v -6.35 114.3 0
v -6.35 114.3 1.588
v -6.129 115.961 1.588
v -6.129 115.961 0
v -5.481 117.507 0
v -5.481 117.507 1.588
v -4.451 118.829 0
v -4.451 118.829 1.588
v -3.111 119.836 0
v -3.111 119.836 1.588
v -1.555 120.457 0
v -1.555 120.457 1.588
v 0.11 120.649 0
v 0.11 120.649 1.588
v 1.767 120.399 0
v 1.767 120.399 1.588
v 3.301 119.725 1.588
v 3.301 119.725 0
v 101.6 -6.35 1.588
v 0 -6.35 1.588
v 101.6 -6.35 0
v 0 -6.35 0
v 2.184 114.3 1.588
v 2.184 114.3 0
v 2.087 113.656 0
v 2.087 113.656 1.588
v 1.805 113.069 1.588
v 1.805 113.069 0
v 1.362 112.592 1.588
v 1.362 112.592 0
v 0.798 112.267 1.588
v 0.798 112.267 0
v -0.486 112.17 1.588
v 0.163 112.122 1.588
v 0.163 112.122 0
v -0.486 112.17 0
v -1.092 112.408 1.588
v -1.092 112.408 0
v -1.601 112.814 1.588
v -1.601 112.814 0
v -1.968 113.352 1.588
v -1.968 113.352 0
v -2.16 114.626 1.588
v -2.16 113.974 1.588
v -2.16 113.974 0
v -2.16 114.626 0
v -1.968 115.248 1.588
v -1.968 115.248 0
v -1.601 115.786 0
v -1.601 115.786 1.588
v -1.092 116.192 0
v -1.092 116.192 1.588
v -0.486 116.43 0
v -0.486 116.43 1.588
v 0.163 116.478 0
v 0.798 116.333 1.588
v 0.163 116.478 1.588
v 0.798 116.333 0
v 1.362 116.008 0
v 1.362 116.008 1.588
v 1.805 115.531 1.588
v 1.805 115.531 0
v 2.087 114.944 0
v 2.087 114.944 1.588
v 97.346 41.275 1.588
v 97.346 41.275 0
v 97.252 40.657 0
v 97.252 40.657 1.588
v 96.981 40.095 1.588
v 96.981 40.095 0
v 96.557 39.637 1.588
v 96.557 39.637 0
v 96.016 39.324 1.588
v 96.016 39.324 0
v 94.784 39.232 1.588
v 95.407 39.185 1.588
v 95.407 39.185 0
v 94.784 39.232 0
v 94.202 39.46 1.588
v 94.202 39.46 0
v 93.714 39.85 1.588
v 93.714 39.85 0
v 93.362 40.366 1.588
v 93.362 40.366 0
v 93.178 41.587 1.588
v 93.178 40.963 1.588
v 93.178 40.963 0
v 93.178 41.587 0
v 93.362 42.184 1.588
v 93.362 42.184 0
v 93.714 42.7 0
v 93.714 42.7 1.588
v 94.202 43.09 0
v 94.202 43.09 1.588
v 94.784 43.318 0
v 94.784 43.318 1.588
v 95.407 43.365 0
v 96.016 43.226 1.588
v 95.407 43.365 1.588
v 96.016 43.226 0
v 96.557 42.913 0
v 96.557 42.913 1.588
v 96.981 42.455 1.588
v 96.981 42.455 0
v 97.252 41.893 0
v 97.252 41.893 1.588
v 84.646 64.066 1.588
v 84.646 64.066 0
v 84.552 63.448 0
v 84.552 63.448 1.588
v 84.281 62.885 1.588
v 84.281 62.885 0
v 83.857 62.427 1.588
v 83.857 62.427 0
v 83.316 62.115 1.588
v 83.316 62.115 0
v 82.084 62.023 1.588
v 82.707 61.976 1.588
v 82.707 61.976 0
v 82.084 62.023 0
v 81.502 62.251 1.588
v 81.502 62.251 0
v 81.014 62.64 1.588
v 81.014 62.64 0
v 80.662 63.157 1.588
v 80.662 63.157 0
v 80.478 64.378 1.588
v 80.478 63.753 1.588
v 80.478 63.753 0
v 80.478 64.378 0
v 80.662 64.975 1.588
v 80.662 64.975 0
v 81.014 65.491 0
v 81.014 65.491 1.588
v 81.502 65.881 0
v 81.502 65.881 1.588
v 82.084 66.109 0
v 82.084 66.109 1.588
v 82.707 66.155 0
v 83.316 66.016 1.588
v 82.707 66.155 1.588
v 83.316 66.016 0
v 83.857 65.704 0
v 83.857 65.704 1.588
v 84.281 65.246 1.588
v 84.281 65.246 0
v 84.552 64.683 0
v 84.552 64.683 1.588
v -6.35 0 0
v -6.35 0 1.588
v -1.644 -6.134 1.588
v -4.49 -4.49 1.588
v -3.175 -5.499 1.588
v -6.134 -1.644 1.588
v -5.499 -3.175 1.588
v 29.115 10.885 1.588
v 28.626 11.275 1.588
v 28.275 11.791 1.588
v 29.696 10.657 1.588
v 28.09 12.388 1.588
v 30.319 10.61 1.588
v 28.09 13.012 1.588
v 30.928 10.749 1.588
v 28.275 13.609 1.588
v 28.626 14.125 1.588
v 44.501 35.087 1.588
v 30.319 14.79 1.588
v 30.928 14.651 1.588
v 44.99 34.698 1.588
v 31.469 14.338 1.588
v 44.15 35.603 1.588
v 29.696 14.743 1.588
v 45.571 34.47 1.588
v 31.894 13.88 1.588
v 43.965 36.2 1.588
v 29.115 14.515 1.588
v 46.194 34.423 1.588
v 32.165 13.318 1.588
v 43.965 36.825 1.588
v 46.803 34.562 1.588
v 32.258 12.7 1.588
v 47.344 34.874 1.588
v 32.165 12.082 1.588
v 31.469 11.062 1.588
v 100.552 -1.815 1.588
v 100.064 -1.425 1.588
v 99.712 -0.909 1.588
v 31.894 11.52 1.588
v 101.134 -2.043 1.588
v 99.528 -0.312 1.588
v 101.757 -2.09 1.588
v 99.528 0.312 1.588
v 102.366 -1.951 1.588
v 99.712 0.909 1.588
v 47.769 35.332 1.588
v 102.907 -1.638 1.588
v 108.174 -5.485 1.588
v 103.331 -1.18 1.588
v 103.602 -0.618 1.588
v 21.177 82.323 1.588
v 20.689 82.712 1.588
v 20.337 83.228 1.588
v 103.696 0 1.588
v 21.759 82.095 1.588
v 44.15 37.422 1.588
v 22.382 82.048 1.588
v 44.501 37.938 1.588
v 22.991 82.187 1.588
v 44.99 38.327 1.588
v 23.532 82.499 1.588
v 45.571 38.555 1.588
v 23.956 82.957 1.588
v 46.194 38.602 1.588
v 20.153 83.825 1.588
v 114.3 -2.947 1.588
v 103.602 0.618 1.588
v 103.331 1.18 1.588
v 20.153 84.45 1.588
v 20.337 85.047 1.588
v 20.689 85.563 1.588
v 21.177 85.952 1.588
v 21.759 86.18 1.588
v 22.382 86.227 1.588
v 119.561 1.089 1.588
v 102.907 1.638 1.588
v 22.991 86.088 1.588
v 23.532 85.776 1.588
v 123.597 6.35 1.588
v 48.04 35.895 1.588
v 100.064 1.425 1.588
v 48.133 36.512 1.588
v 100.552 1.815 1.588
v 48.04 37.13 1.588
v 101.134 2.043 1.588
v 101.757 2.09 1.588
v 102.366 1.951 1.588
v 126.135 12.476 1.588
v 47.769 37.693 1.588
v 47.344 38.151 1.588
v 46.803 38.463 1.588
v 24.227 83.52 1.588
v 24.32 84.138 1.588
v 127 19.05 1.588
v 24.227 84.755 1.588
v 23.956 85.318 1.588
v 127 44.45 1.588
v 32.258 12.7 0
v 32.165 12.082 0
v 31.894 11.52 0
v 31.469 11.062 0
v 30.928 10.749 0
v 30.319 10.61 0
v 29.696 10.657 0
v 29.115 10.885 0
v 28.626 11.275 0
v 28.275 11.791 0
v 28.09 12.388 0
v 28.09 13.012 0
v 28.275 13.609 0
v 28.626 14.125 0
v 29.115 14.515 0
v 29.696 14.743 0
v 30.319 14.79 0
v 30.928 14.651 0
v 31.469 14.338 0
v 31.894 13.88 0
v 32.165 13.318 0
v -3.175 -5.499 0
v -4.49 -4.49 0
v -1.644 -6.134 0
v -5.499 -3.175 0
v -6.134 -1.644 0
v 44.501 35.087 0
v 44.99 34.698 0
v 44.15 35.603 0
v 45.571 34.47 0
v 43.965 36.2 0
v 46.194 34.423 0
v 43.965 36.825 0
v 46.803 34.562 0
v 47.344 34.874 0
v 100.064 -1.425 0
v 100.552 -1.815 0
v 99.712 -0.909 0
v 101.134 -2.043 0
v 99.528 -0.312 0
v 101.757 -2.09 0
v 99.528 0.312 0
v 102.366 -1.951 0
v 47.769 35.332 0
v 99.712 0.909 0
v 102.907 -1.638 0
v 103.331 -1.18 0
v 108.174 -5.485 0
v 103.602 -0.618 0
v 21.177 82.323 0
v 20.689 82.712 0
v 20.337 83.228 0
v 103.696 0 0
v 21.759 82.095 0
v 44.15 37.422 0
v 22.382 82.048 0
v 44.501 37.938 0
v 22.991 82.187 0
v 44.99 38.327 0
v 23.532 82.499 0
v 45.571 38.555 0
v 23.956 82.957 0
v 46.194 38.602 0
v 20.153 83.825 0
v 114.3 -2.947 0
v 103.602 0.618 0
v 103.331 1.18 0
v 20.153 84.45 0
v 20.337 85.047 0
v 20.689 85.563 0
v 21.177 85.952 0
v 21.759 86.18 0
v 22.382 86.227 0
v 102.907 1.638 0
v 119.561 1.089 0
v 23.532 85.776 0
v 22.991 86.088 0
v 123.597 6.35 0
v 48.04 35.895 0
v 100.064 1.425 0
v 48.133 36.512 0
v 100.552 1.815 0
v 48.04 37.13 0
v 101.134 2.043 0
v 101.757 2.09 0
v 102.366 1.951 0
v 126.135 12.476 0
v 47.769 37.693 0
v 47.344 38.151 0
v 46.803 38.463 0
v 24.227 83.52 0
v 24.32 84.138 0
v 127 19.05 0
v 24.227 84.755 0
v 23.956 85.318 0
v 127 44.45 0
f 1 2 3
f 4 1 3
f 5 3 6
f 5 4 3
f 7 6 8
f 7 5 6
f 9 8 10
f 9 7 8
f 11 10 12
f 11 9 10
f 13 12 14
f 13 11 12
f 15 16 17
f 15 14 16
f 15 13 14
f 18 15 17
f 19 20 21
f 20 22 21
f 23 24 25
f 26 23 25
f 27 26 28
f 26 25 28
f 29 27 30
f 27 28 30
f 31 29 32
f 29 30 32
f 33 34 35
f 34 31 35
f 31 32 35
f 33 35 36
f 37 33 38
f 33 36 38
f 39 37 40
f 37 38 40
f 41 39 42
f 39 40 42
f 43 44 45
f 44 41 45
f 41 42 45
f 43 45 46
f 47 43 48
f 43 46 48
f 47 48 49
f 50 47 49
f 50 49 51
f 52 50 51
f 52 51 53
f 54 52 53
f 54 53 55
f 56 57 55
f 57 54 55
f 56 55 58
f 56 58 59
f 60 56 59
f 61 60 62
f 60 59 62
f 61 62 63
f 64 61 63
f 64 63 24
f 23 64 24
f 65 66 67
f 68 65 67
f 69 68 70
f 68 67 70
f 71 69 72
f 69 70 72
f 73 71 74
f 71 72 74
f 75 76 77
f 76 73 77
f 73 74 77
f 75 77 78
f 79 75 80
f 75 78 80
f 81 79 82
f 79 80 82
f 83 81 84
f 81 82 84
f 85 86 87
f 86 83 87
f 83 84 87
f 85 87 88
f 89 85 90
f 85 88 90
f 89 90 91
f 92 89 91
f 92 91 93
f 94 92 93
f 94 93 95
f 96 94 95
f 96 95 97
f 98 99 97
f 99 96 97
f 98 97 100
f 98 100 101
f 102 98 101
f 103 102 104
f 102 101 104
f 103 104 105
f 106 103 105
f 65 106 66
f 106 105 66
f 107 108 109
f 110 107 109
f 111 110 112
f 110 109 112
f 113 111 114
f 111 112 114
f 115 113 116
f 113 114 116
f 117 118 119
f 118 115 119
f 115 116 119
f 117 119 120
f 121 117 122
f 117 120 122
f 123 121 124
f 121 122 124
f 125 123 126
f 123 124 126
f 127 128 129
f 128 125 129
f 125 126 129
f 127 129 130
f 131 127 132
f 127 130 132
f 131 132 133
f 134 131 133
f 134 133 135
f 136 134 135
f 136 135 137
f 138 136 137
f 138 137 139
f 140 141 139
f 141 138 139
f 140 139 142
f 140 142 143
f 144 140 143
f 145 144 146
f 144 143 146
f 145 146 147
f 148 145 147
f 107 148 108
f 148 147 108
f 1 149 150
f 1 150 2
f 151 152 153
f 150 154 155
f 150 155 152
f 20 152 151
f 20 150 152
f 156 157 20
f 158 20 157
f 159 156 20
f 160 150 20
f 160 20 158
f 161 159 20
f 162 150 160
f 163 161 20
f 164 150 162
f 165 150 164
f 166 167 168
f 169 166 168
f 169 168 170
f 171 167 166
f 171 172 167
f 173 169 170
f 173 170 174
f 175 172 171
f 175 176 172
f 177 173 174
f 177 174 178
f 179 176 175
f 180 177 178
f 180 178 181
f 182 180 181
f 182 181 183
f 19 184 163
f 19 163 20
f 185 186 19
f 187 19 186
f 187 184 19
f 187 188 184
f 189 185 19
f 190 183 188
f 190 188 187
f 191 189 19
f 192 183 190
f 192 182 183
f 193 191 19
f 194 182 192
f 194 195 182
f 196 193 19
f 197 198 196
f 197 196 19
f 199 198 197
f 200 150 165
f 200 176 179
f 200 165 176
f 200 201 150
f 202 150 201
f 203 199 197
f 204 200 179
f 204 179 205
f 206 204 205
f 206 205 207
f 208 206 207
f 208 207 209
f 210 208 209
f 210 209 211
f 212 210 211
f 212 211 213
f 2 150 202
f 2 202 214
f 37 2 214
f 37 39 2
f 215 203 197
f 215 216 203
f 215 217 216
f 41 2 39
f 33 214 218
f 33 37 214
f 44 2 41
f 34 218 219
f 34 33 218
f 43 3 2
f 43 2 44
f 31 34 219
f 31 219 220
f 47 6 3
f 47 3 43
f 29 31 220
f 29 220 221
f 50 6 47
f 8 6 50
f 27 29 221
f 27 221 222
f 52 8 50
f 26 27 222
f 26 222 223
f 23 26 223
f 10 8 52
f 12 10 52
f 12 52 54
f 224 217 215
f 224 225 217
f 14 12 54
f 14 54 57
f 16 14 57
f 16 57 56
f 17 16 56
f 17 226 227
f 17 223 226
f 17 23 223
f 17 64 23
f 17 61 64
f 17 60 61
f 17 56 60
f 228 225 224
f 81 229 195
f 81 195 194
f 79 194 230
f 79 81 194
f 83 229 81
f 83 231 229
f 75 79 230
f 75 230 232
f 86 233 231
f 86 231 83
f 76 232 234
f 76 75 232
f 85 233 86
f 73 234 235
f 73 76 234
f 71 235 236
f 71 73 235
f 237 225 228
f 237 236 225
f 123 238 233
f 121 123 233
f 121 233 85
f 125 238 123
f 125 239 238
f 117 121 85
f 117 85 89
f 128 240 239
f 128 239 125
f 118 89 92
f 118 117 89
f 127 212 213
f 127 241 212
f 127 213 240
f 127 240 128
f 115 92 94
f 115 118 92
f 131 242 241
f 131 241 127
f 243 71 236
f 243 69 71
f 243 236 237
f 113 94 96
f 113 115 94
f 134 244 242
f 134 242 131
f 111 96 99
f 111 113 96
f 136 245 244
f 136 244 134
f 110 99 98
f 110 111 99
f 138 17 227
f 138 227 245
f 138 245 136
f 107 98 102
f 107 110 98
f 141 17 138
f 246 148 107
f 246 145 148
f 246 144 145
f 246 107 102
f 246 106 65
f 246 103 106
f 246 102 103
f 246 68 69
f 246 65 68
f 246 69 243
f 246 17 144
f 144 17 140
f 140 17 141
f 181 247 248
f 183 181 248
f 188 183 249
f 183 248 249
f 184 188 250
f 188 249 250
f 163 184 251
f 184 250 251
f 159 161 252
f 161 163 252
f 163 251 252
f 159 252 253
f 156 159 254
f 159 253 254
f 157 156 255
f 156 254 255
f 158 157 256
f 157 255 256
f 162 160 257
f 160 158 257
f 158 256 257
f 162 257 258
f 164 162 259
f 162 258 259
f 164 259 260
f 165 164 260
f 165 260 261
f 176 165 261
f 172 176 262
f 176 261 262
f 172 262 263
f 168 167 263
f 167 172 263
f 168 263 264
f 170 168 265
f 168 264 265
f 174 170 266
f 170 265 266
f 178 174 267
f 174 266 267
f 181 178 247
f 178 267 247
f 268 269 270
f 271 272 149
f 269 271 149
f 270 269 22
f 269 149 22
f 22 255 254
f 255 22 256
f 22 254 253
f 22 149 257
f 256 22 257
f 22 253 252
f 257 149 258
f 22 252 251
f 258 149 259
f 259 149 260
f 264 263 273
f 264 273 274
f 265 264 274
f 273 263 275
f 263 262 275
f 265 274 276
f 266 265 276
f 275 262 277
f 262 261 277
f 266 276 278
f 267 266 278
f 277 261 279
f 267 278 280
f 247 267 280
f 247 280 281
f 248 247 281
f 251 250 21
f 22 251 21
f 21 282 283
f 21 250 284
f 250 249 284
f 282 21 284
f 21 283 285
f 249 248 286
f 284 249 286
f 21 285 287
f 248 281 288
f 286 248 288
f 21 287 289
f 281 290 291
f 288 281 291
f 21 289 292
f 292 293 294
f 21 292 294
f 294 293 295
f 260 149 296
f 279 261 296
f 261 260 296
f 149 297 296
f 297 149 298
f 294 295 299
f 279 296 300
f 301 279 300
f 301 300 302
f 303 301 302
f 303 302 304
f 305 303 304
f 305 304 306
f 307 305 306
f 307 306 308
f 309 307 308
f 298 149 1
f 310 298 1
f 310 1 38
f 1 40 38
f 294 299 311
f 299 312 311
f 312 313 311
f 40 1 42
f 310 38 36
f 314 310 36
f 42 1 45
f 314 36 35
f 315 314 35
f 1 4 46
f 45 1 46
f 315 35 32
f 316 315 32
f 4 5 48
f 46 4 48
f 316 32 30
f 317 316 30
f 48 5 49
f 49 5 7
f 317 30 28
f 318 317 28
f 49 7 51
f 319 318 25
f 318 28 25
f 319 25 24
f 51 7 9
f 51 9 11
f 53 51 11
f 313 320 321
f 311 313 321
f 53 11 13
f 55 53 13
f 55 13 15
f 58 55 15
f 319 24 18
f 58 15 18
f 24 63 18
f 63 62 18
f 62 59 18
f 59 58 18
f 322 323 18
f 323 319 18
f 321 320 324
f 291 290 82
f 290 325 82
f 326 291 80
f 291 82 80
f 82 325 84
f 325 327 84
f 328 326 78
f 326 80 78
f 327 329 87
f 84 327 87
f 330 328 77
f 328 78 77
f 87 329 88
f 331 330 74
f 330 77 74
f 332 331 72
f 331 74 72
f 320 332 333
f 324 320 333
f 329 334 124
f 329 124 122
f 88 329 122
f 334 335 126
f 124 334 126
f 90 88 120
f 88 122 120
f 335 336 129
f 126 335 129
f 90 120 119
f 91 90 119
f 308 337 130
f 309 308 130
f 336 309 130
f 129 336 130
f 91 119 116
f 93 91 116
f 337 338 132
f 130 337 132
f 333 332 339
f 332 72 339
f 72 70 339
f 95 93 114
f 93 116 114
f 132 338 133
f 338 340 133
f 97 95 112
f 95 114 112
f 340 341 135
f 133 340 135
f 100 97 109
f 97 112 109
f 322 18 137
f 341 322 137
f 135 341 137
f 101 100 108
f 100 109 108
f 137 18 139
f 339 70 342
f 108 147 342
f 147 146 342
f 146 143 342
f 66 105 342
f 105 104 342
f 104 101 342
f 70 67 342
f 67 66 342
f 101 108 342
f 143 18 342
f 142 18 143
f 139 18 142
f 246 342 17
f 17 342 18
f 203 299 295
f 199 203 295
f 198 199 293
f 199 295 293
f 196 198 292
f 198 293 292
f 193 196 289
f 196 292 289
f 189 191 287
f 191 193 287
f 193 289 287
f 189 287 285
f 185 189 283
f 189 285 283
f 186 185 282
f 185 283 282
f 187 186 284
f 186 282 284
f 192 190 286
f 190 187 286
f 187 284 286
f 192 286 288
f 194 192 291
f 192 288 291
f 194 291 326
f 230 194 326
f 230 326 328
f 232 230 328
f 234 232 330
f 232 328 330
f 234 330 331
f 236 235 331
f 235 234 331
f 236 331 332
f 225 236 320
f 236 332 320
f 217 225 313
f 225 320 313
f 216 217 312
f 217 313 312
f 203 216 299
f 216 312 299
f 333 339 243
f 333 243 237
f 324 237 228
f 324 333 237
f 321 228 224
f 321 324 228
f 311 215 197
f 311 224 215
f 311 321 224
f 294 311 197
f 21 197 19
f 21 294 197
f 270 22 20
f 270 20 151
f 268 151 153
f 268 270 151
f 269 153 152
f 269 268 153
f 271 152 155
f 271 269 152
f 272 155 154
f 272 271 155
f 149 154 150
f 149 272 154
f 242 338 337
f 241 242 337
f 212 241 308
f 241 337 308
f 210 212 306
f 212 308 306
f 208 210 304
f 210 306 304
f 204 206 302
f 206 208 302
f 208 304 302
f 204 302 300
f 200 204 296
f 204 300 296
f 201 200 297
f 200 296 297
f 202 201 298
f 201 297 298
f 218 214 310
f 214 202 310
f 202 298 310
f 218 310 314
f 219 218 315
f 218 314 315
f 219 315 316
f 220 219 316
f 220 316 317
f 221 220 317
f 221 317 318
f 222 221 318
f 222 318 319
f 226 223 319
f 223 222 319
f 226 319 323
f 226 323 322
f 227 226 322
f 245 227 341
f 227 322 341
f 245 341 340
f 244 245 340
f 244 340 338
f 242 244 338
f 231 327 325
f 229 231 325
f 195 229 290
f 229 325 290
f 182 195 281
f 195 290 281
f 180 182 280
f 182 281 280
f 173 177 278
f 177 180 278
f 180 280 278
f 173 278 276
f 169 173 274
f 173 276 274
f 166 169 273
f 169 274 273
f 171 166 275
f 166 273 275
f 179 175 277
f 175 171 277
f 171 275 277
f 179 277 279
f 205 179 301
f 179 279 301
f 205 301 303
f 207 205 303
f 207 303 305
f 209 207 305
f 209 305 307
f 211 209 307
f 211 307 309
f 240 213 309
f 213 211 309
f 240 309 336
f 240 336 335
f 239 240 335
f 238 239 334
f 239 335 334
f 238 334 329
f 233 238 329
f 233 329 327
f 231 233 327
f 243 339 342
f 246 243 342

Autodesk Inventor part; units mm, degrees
ref_plane "YZ Plane" through (0, 0, 0) normal (1, 0, 0) x (0, 1, 0)
ref_plane "XZ Plane" through (0, 0, 0) normal (0, 1, 0) x (-1, 0, 0)
ref_plane "XY Plane" through (0, 0, 0) normal (0, 0, 1) x (1, 0, 0)
sketch "Block1" plane through (0, 0, 0) normal (0, 0, 1) x (1, 0, 0)
  circle A0 centre (36.7608, -51.6694) radius 2.0955
  circle A1 centre (30.4108, -10.3944) radius 2.0955
  circle A2 centre (17.7108, 12.3965) radius 2.0955
  circle A3 centre (-18.8017, -15.1569) radius 2.0955
  circle A4 centre (-34.6767, -38.9694) radius 2.0955
  line L0 (-64.8392, -58.0194) -> (36.7608, -58.0194)
  line L1 (62.1608, -7.2194) -> (-61.5382, 68.0552)
  circle A5 centre (-42.6142, 32.4681) radius 2.0955
  circle A6 centre (-64.8392, 62.6306) radius 2.1844
  arc A7 (-61.5382, 68.0552) -> (-71.1892, 62.6306) centre (-64.8392, 62.6306) ccw
  line L2 (-71.1892, -51.6694) -> (-71.1892, 62.6306)
  arc A8 (-71.1892, -51.6694) -> (-64.8392, -58.0194) centre (-64.8392, -51.6694) ccw
  line L3 (62.1608, -32.6194) -> (62.1608, -7.2194)
  arc A9 (36.7608, -58.0194) -> (62.1608, -32.6194) centre (36.7608, -32.6194) ccw
  point P0 (-13.0925, -13.6067)
  point P1 (62.1608, -58.0194)
  dimension "d0" = 12.7
  dimension "d1" = 12.7
  dimension "d2" = 50.8
  dimension "d3" = 25.4
  dimension "d4" = 4.191
  dimension "d5" = 4.191
  dimension "d6" = 4.191
  dimension "d7" = 4.191
  dimension "d8" = 4.191
  dimension "d9" = 4.191
sketch "main" plane through (0, 0, 0) normal (0, 0, 1) x (1, 0, 0)
  circle A0 centre (36.7608, -51.6694) radius 2.0955
  circle A1 centre (30.4108, -10.3944) radius 2.0955
  circle A2 centre (17.7108, 12.3965) radius 2.0955
  circle A3 centre (-18.8017, -15.1569) radius 2.0955
  circle A4 centre (-34.6767, -38.9694) radius 2.0955
  line L0 (-64.8392, -58.0194) -> (36.7608, -58.0194)
  line L1 (62.1608, -7.2194) -> (-61.5382, 68.0552)
  circle A5 centre (-42.6142, 32.4681) radius 2.0955
  circle A6 centre (-64.8392, 62.6306) radius 2.1844
  arc A7 (-61.5382, 68.0552) -> (-71.1892, 62.6306) centre (-64.8392, 62.6306) ccw
  line L2 (-71.1892, -51.6694) -> (-71.1892, 62.6306)
  arc A8 (-71.1892, -51.6694) -> (-64.8392, -58.0194) centre (-64.8392, -51.6694) ccw
  line L3 (62.1608, -32.6194) -> (62.1608, -7.2194)
  arc A9 (36.7608, -58.0194) -> (62.1608, -32.6194) centre (36.7608, -32.6194) ccw
  point P0 (-13.0925, -13.6067)
sketch "Sketch1" plane through (0, 0, 0) normal (0, 0, 1) x (1, 0, 0)
  circle A0 centre (12.7, 0) radius 2.0955
  circle A1 centre (101.6, 0) radius 2.0955
  circle A2 centre (95.25, 41.275) radius 2.0955
  circle A3 centre (82.55, 64.0658) radius 2.0955
  circle A4 centre (46.0375, 36.5125) radius 2.0955
  circle A5 centre (30.1625, 12.7) radius 2.0955
  line L0 (0, -6.35) -> (101.6, -6.35)
  line L1 (127, 44.45) -> (3.301, 119.7246)
  circle A6 centre (22.225, 84.1375) radius 2.0955
  circle A7 centre (0, 114.3) radius 2.1844
  arc A8 (3.301, 119.7246) -> (-6.35, 114.3) centre (0, 114.3) ccw
  line L2 (-6.35, 0) -> (-6.35, 114.3)
  arc A9 (-6.35, 0) -> (0, -6.35) centre (0, 0) ccw
  line L3 (127, 19.05) -> (127, 44.45)
  arc A10 (101.6, -6.35) -> (127, 19.05) centre (101.6, 19.05) ccw
  dimension "d12" = 4.191
extrude "Extrusion1" add sketch "Sketch1" along normal blind 1.5875 contours A0 | A9 L2 A8 L1 L3 A10 L0
equation "\"BendRadius\" = Thickness"
equation "\"BendReliefWidth\" = Thickness"
equation "\"BendReliefDepth\" = 0.5 * Thickness"
equation "\"CornerReliefSize\" = 4 * Thickness"
equation "\"MinimumRemnant\" = 2 * Thickness"
equation "\"TransitionRadius\" = BendRadius"
equation "\"JacobiRadiusSize\" = BendRadius"
equation "\"GapSize\" = Thickness"
equation "\"Thickness\" = 1.5875"
properties part number "blocker" material "Acetal Resin, White"
